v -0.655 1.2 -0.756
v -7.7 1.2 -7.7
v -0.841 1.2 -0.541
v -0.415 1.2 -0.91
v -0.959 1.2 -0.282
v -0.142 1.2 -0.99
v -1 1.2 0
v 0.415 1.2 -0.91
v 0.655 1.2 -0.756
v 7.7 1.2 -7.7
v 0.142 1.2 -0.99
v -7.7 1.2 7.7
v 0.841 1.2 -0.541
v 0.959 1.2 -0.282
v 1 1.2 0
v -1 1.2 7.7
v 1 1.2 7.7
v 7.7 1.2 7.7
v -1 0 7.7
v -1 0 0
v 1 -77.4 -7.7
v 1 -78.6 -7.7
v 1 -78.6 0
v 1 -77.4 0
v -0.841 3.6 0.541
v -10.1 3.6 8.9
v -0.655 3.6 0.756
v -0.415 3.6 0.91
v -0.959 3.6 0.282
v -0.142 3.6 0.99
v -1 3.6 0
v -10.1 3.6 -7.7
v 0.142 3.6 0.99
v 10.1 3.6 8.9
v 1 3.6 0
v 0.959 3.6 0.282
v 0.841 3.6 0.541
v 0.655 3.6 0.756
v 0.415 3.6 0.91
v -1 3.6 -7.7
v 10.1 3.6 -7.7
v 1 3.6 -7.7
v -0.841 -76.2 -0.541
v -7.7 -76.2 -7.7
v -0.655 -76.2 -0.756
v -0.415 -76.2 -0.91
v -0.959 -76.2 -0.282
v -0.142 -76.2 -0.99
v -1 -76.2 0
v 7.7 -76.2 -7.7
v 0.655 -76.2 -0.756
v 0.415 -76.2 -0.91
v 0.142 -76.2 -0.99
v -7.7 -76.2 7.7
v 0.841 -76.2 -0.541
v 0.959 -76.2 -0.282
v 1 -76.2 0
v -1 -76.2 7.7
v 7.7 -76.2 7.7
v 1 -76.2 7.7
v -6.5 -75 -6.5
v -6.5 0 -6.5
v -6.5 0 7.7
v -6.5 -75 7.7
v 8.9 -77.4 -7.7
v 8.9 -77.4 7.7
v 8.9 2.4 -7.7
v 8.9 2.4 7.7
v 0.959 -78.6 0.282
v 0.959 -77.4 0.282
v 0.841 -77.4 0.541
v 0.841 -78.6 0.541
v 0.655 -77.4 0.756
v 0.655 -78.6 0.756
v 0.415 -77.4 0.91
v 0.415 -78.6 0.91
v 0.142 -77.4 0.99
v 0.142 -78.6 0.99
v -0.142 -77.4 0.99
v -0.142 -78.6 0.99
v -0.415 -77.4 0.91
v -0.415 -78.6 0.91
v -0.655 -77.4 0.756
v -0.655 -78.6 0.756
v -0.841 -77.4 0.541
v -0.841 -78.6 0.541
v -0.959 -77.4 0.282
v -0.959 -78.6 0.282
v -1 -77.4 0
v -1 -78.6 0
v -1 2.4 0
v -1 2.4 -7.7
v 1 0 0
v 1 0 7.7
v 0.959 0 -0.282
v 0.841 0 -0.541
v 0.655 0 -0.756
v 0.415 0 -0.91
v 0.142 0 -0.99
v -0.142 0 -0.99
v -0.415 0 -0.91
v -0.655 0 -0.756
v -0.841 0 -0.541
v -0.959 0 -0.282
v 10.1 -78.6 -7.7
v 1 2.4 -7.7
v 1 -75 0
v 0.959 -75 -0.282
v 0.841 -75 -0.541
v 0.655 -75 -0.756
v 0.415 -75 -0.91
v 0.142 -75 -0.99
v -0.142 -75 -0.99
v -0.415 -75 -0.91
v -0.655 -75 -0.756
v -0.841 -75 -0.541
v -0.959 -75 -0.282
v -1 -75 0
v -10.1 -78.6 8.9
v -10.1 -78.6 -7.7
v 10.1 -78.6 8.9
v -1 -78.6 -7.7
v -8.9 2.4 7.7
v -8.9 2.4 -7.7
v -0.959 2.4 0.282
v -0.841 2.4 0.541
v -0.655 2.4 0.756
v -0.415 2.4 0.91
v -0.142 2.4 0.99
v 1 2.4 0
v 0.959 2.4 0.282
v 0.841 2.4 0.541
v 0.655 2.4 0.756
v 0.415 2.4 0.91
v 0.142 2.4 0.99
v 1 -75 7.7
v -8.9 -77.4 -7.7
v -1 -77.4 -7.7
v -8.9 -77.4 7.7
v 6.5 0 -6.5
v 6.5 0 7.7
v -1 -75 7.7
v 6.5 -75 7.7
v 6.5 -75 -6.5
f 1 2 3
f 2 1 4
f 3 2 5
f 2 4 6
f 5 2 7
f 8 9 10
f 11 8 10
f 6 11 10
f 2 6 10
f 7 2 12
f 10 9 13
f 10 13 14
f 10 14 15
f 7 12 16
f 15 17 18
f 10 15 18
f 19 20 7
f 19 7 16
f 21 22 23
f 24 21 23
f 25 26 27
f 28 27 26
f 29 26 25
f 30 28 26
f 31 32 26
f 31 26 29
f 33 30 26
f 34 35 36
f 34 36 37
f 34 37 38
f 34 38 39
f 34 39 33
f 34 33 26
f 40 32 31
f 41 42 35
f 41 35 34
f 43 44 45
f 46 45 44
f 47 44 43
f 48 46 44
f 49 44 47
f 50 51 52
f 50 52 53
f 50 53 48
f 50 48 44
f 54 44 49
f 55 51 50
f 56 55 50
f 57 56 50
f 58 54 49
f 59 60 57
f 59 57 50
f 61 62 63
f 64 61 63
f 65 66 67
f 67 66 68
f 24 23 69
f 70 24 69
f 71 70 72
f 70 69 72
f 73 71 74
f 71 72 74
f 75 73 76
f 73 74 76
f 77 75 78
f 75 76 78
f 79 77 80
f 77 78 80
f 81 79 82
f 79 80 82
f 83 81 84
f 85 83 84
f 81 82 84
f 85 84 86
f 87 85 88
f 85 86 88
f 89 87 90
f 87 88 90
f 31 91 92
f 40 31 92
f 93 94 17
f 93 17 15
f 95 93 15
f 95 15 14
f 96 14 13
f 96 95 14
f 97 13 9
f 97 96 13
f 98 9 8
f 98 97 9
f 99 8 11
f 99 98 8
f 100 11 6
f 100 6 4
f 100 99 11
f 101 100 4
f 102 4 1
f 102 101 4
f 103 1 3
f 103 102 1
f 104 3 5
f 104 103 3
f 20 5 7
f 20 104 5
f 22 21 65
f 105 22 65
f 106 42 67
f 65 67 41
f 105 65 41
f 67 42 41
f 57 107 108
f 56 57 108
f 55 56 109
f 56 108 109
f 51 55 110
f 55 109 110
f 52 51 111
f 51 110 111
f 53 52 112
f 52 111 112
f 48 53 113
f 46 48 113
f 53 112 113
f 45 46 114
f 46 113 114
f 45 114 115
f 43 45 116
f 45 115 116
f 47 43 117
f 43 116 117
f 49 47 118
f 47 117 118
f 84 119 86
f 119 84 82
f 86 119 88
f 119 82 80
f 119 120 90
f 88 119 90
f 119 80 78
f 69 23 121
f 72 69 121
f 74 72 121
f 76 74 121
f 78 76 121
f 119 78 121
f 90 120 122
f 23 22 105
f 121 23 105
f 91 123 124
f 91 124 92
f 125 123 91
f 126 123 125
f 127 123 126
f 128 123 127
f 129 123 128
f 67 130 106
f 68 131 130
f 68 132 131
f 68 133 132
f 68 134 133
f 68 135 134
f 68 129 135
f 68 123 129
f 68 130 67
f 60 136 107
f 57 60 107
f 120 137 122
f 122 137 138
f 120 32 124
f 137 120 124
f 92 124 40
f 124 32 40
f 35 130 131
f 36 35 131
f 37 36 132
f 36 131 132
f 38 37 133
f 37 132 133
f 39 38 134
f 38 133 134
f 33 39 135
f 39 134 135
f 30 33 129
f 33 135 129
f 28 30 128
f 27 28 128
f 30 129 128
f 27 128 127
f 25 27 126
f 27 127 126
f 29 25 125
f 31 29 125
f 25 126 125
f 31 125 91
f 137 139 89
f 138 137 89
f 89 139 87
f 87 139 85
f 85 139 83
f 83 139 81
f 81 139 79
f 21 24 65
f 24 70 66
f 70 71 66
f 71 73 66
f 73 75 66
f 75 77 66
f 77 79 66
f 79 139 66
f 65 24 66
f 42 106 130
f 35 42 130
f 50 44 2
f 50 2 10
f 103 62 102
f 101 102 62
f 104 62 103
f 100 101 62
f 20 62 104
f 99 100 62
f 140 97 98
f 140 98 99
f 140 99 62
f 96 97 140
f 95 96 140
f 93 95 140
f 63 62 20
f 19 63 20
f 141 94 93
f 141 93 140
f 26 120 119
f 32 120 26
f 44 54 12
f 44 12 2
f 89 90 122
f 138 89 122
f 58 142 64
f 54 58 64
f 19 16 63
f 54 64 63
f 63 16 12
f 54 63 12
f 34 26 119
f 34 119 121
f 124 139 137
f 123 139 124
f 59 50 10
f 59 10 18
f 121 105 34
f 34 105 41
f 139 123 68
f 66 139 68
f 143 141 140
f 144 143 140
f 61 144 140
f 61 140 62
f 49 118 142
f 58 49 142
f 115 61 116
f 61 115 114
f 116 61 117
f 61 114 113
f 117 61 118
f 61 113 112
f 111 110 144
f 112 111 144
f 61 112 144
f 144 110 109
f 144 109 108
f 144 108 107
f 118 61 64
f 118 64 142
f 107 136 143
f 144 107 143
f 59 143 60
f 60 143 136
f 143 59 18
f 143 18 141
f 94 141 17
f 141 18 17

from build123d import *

# Parameters (mm, degrees)
F2_DEPTH  = 75
F1_W      = 5.5
F1_H      = 1.2
F3_DEPTH  = 1.2
F4_W      = 5.5
F4_H      = 1.2
F5_DEPTH  = 1.2
F6_W      = 20.2
F6_H      = 82.2
F6_W_2    = 17.8
F6_H_2    = 79.8
F7_DEPTH  = 15.4
F9_DEPTH  = 82.201
F10_W     = 20.2
F10_H     = 82.2
F11_DEPTH = 1.2


with BuildPart() as f2:
    # F1 (on Front) → F2 (new body)
    with BuildSketch(Plane.XZ):
        Polygon((6.5, 6.5), (6.5, -6.5), (-6.5, -6.5), (-6.5, 6.5), (-6.5, 7.7), (-7.7, 7.7), (-7.7, -7.7), (7.7, -7.7), (7.7, 7.7), (6.5, 7.7), align=None)
    extrude(amount=F2_DEPTH)

    # F1 (on Front) → F3 (join)
    with BuildSketch(Plane.XZ):
        with Locations((-3.75, 7.1)):
            Rectangle(F1_W, F1_H)
        with BuildLine():
            Line((-6.5, -6.5), (6.5, -6.5))
            Line((6.5, -6.5), (6.5, 6.5))
            Line((6.5, 6.5), (1, 6.5))
            Line((1, 6.5), (1, 0))
            ThreePointArc((1, 0), (0, -1), (-1, 0))
            Line((-1, 0), (-1, 6.5))
            Line((-1, 6.5), (-6.5, 6.5))
            Line((-6.5, 6.5), (-6.5, -6.5))
        make_face()
        Polygon((6.5, 6.5), (6.5, -6.5), (-6.5, -6.5), (-6.5, 6.5), (-6.5, 7.7), (-7.7, 7.7), (-7.7, -7.7), (7.7, -7.7), (7.7, 7.7), (6.5, 7.7), align=None)
        with Locations((3.75, 7.1)):
            Rectangle(F1_W, F1_H)
    extrude(amount=-F3_DEPTH)

    # F4 (on face) → F5 (join)
    with BuildSketch(Plane.XZ.offset(75)):
        with BuildLine():
            Line((-6.5, 6.5), (-6.5, -6.5))
            Line((-6.5, -6.5), (6.5, -6.5))
            Line((6.5, -6.5), (6.5, 6.5))
            Line((6.5, 6.5), (1, 6.5))
            Line((1, 6.5), (1, 0))
            ThreePointArc((1, 0), (0, -1), (-1, 0))
            Line((-1, 0), (-1, 6.5))
            Line((-1, 6.5), (-6.5, 6.5))
        make_face()
        Polygon((6.5, -6.5), (-6.5, -6.5), (-6.5, 6.5), (-6.5, 7.7), (-7.7, 7.7), (-7.7, -7.7), (7.7, -7.7), (7.7, 7.7), (6.5, 7.7), (6.5, 6.5), align=None)
        with Locations((3.75, 7.1)):
            Rectangle(F4_W, F4_H)
        with Locations((-3.75, 7.1)):
            Rectangle(F4_W, F4_H)
    extrude(amount=F5_DEPTH)


with BuildPart() as f7:
    # F6 (on face) → F7 (new body, through all)
    with BuildSketch(Plane.XY.offset(7.7)):
        with Locations((0, -37.5)):
            Rectangle(F6_W, F6_H)
        with Locations((0, -37.5)):
            Rectangle(F6_W_2, F6_H_2, mode=Mode.SUBTRACT)
    extrude(amount=-F7_DEPTH)

    # F8 (on face) → F9 (cut, through all)
    with BuildSketch(Plane.XZ.offset(78.6)):
        with BuildLine():
            Line((1, -7.7), (1, 0))
            ThreePointArc((1, 0), (0, 1), (-1, 0))
            Line((-1, 0), (-1, -7.7))
            Line((-1, -7.7), (1, -7.7))
        make_face()
    extrude(amount=-F9_DEPTH, mode=Mode.SUBTRACT)

    # F10 (on face) → F11 (join)
    with BuildSketch(Plane.XY.offset(7.7)):
        with Locations((0, -37.5)):
            Rectangle(F10_W, F10_H)
    extrude(amount=F11_DEPTH)


solid = Compound([f2.part, f7.part])
